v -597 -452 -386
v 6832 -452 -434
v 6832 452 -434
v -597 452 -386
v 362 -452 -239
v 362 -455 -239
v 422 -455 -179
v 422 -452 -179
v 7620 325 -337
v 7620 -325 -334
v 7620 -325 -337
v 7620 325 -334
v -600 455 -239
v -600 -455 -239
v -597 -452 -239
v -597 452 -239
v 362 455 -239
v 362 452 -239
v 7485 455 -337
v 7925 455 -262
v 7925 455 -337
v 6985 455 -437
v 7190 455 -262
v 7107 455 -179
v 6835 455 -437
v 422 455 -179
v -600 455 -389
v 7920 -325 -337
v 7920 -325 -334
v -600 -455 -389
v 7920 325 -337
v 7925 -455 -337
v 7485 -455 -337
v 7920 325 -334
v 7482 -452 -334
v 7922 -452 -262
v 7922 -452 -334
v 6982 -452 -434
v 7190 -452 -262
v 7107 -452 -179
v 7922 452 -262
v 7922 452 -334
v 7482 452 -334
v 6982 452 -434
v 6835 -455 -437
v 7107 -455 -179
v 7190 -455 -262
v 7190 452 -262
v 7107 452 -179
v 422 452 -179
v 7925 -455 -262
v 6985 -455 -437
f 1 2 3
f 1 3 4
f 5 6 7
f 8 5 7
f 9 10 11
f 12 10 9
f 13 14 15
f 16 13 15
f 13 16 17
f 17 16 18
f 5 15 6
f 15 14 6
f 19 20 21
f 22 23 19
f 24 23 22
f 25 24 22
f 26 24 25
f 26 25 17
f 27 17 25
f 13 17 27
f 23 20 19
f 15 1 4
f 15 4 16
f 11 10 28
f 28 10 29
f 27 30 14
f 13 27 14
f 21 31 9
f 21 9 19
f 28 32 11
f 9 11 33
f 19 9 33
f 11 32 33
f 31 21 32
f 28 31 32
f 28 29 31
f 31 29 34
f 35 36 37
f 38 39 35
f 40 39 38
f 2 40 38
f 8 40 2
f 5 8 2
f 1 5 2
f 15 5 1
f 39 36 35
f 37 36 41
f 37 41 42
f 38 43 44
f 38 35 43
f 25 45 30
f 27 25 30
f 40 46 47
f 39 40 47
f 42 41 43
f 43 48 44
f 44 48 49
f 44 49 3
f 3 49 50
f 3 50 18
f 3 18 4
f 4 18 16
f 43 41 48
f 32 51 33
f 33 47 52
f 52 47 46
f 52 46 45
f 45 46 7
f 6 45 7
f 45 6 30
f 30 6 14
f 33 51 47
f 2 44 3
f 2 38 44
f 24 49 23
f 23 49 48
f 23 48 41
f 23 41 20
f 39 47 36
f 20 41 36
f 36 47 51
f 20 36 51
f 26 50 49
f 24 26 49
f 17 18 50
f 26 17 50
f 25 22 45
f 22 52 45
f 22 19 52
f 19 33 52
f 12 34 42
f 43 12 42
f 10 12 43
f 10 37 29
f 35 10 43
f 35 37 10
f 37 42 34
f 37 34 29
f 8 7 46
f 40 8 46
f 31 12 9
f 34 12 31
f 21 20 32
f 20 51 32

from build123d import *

# Parameters (mm, degrees)
SKETCH_W         = 300
SKETCH_H         = 650
EXTRUDE_DEPTH    = 10
EXTRUDE032_DEPTH = 452
EXTRUDE015_DEPTH = 455


with BuildPart() as extrude_body:
    # Sketch (on Face21 of Cut) → Extrude (new body)
    with BuildSketch(Plane.XY.offset(-334)):
        with Locations((7770, 0)):
            Rectangle(SKETCH_W, SKETCH_H)
    extrude(amount=-EXTRUDE_DEPTH)


with BuildPart() as extrude032:
    # Sketch033 → Extrude032 (new body, symmetric)
    with BuildSketch(Plane.XZ):
        Polygon((-597, -239), (362, -239), (422, -179), (7104, -179), (7187, -262), (7922, -262), (7922, -337), (7482, -337), (6982, -437), (6832, -437), (-597, -389), align=None)
    extrude(amount=EXTRUDE032_DEPTH, both=True)


with BuildPart() as extrude032_1:
    # Extrude032 placement: moved
    add(extrude032.part.moved(Location((0, 0, 3))))


with BuildPart() as cut002:
    # Sketch023 → Extrude015 (new body, symmetric)
    with BuildSketch(Plane.XZ):
        Polygon((-600, -239), (362, -239), (422, -179), (7107, -179), (7190, -262), (7925, -262), (7925, -337), (7485, -337), (6985, -437), (6835, -437), (-600, -389), align=None)
    extrude(amount=EXTRUDE015_DEPTH, both=True)

    # Cut: cut Extrude032
    add(extrude032_1.part, mode=Mode.SUBTRACT)

    # Cut002: cut Extrude body
    add(extrude_body.part, mode=Mode.SUBTRACT)


solid = cut002.part
